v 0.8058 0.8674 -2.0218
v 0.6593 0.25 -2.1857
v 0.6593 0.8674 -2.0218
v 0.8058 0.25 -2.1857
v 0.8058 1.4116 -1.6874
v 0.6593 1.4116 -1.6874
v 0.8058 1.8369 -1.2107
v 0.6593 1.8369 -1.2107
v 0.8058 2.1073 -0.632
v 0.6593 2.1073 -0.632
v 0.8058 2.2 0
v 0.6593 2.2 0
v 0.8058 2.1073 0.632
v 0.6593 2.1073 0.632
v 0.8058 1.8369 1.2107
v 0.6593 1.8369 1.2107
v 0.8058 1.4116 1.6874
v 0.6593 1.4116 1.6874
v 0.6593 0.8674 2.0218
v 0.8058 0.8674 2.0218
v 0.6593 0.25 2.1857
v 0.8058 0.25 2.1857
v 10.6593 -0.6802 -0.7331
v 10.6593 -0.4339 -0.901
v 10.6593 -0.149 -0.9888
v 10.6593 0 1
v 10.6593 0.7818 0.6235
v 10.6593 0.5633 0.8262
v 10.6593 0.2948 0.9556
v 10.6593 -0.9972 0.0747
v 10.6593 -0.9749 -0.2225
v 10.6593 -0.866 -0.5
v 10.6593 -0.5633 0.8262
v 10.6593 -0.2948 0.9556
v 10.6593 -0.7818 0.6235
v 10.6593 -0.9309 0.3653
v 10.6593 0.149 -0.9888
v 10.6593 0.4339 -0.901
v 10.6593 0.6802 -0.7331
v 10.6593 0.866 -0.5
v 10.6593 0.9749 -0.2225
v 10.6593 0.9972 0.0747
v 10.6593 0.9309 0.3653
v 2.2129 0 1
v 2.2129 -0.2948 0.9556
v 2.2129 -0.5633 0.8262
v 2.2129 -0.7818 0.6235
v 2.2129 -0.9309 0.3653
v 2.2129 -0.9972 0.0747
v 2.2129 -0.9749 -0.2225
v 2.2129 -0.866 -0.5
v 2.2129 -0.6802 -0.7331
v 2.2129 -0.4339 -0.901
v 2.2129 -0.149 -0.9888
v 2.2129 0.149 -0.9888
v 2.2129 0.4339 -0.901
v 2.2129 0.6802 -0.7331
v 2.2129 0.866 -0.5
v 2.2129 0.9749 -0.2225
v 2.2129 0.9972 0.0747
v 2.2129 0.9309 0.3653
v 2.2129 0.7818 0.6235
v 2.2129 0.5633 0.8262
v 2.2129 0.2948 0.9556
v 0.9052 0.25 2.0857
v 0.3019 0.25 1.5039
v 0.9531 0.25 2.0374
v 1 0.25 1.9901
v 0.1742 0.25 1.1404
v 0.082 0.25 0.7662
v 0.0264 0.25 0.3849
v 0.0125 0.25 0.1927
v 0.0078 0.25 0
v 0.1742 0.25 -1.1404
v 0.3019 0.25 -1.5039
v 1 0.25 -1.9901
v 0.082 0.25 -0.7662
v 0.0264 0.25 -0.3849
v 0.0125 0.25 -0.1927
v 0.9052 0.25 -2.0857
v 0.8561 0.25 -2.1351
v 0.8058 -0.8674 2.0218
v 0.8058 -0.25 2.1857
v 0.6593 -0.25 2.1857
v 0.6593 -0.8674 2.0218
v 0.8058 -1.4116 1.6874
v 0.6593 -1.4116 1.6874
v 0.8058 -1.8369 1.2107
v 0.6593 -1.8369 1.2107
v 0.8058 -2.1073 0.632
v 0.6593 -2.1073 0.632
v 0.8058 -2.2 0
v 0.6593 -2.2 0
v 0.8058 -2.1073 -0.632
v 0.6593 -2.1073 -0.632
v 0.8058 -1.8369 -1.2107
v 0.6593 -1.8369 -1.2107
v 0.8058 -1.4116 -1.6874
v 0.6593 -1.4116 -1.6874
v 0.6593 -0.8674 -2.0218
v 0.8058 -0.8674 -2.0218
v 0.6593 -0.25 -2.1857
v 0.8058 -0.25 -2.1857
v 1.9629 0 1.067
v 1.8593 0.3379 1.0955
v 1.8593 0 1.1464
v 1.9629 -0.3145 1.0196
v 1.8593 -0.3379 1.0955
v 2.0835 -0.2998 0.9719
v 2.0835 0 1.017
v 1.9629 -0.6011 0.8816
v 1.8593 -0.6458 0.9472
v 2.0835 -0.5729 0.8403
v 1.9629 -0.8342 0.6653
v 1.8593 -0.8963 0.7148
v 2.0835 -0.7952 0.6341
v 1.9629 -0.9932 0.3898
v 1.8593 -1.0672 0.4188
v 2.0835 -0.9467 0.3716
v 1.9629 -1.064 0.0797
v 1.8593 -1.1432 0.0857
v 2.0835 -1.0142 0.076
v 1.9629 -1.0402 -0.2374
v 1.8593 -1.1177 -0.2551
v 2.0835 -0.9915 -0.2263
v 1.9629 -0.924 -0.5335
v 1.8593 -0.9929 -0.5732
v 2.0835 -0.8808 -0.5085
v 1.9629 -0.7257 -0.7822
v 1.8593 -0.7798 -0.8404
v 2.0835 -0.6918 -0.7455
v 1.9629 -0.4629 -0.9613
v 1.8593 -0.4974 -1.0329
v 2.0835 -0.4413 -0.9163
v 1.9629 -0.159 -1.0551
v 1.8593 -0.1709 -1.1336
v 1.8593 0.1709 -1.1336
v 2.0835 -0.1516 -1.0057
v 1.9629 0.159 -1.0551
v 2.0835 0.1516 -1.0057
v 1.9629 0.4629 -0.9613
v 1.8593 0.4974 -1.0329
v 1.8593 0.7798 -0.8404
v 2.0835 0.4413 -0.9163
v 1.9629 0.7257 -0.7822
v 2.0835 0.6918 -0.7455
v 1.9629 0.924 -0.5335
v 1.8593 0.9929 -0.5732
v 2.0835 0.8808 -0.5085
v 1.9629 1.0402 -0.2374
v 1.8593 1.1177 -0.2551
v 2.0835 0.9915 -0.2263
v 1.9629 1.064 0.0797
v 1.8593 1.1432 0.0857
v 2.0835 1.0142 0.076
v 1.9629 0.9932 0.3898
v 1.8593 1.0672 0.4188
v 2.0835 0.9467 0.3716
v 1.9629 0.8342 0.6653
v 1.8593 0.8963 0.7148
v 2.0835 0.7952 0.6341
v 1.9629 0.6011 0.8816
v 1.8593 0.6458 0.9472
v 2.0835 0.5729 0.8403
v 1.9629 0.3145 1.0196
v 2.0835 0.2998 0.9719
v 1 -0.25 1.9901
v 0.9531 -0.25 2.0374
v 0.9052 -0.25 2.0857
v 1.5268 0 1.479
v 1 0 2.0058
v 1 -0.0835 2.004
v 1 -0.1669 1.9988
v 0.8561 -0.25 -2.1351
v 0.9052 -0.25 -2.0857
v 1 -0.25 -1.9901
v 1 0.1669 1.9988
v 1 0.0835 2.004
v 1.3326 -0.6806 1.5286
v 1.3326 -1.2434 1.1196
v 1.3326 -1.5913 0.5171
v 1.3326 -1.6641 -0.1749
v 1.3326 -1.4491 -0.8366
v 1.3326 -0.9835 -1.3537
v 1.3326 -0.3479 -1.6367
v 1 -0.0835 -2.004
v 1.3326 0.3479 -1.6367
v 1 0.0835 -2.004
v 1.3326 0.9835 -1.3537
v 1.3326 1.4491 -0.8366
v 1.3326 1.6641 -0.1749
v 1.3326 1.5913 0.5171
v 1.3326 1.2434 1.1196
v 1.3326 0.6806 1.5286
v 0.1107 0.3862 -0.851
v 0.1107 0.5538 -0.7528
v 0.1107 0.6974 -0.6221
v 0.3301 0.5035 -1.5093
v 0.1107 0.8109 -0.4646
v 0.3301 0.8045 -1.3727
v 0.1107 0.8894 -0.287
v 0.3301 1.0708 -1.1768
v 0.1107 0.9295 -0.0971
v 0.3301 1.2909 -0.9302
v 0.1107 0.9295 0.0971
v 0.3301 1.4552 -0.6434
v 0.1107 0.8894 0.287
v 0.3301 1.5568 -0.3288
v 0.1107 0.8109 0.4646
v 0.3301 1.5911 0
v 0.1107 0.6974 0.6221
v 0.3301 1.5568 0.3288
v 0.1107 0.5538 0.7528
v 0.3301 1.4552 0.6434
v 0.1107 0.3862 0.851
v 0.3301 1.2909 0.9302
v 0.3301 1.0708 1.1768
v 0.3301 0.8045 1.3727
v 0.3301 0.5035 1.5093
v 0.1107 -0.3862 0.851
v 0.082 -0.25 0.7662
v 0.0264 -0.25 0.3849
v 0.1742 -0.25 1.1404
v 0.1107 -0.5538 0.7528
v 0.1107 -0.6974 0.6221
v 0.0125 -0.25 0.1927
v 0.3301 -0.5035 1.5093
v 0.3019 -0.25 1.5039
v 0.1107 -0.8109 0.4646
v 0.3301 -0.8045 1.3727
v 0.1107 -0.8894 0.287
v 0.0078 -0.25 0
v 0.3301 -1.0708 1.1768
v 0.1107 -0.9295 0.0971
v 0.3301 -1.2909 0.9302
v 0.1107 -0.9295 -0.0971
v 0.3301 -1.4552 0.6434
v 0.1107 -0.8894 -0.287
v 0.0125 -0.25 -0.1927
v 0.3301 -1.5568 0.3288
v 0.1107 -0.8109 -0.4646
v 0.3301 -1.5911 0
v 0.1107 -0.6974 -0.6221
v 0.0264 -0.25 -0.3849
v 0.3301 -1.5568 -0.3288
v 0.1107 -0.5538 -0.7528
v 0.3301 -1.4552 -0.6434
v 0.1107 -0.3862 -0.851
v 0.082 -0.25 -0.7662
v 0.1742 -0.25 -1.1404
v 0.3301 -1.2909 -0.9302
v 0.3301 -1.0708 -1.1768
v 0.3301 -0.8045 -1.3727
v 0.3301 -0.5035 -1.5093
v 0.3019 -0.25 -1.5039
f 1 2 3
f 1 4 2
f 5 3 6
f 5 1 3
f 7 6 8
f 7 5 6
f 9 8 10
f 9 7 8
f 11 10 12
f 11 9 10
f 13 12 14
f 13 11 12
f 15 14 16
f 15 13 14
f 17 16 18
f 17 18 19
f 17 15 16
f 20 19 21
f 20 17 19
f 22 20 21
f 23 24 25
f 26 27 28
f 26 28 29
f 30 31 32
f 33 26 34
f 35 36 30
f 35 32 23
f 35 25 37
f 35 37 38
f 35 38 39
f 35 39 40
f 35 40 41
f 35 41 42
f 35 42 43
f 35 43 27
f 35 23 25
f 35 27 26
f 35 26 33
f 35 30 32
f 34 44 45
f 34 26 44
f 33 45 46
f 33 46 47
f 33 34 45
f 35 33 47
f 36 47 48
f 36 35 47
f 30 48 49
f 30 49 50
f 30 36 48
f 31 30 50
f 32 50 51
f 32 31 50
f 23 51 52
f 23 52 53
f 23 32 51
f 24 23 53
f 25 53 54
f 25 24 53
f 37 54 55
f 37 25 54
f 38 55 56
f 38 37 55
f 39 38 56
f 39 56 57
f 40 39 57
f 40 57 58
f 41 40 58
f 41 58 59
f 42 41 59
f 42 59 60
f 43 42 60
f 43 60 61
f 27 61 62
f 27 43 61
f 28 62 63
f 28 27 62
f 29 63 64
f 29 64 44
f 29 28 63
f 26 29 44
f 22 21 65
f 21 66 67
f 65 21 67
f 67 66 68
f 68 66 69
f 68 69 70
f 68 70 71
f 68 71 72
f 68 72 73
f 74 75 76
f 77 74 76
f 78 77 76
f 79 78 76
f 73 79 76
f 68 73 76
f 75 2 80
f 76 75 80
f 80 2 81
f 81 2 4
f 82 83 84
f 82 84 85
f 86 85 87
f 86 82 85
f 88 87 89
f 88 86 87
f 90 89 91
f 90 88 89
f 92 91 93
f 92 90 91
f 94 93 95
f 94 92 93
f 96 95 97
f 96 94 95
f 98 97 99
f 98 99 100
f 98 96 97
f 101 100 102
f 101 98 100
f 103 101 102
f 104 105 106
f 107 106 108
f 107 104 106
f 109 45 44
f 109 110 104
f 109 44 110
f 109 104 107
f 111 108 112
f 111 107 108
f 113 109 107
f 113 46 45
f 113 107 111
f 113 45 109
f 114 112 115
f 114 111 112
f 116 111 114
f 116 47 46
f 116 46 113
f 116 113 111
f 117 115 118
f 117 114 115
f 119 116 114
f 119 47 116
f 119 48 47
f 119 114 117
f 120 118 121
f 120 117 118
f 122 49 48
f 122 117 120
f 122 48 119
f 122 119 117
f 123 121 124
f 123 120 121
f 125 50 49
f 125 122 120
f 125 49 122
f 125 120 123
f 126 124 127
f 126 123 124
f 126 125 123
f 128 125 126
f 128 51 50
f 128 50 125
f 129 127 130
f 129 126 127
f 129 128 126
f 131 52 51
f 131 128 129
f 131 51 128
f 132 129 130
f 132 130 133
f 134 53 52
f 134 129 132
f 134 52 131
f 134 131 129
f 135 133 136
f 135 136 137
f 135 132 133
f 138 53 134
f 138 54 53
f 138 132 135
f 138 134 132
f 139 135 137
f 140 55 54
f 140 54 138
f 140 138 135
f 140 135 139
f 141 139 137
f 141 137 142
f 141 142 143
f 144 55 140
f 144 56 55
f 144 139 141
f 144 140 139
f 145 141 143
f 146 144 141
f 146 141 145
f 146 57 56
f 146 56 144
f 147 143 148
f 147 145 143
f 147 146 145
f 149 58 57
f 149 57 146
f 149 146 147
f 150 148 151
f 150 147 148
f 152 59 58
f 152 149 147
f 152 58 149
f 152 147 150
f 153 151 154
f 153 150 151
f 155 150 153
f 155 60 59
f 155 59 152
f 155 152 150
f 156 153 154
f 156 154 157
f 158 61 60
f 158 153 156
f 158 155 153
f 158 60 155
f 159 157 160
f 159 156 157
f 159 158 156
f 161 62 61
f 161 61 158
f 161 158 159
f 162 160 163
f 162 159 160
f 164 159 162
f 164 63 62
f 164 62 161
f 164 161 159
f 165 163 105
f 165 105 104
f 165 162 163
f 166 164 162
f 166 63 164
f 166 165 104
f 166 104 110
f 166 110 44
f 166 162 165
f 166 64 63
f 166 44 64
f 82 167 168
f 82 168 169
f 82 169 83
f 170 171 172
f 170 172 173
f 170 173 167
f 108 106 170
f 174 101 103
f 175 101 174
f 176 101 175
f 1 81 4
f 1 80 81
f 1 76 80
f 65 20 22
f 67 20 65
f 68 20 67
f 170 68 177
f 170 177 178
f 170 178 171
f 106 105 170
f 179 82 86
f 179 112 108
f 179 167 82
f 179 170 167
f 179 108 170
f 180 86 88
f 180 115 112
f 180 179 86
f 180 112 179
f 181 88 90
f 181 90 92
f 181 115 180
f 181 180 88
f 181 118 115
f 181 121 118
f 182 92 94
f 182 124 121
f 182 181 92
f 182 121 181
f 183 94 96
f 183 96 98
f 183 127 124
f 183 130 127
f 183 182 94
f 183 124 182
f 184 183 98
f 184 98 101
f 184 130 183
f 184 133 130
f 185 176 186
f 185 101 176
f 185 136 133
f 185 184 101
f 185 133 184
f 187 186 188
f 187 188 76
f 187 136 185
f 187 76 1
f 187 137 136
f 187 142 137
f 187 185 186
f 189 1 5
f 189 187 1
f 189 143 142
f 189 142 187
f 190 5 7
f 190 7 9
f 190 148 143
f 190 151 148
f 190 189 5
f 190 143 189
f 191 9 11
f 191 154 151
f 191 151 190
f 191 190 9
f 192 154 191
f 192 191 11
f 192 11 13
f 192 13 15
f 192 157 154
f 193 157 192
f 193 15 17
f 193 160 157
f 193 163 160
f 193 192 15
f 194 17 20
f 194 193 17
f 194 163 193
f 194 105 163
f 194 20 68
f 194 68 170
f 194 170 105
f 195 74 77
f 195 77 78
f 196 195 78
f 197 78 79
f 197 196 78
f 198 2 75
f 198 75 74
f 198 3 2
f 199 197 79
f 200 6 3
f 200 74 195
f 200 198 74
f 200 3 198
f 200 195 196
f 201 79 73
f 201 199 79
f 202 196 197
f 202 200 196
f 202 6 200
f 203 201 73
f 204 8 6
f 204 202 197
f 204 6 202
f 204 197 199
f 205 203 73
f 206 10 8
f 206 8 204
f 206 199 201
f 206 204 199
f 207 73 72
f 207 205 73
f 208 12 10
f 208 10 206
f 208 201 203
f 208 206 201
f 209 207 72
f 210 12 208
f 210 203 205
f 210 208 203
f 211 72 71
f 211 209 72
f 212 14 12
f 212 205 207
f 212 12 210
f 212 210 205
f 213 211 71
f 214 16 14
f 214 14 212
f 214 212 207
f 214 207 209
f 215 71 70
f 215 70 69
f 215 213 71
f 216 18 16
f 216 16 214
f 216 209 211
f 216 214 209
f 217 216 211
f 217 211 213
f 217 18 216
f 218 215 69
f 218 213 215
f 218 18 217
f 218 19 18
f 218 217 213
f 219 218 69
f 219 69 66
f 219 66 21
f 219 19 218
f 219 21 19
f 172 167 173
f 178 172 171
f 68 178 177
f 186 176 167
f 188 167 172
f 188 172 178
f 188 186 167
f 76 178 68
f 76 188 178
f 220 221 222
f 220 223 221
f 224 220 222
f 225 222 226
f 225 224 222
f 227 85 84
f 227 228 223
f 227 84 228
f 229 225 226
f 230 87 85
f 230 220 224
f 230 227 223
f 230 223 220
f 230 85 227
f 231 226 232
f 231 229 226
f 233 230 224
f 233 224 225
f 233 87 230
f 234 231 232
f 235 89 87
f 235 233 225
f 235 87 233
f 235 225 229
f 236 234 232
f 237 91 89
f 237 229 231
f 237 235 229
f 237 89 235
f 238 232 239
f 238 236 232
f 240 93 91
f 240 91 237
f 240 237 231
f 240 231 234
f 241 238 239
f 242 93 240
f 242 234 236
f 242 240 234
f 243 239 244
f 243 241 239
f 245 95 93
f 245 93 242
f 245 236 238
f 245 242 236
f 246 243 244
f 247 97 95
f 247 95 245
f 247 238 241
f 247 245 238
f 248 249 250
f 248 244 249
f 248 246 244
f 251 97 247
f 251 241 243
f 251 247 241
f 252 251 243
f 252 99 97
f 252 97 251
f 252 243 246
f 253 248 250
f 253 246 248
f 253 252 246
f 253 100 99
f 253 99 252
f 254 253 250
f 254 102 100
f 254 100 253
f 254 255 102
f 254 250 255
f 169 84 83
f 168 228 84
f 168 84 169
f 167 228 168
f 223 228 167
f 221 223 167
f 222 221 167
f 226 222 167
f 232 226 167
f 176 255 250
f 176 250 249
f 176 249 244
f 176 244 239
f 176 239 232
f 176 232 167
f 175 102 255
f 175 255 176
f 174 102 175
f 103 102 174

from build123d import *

# Parameters (mm, degrees)
SLOT_DEPTH      = 12.1041235
SLOT_DEPTH_BACK = 12.1041235
SKE_SLOT_W      = 1
SKE_SLOT_H      = 0.5


with BuildPart() as part:
    # Ske-Screw → Base (revolve)
    with BuildSketch(Plane.XY, mode=Mode.PRIVATE) as base_sk:
        with BuildLine():
            Line((0.659341382, 2.2), (0.805787992, 2.2))
            Line((0.805787992, 2.2), (1.859341382, 1.146446609))
            ThreePointArc((1.859341382, 1.146446609), (2.021553057, 1.038060234), (2.212894773, 1))
            Line((2.212894773, 1), (10.659341382, 1))
            Line((10.659341382, 1), (10.659341382, 0))
            Line((10.659341382, 0), (0.659341382, 0))
            Line((0.659341382, 0), (0, 0))
            ThreePointArc((0, 0), (0.168379294, 1.148339133), (0.659341382, 2.2))
        make_face()
    revolve(base_sk.sketch.rotate(Axis((-1.349906986, 0, 0), (1, 0, 0)), 90), axis=Axis((-1.349906986, 0, 0), (1, 0, 0)))

    # Ske-Slot → Slot (cut, two sides: drawn at the far end of the back side and taken through both)
    with BuildSketch(Plane.XY.offset(-SLOT_DEPTH_BACK)):
        with Locations((0.5, 0)):
            Rectangle(SKE_SLOT_W, SKE_SLOT_H)
    extrude(amount=SLOT_DEPTH + SLOT_DEPTH_BACK, mode=Mode.SUBTRACT)


solid = part.part
